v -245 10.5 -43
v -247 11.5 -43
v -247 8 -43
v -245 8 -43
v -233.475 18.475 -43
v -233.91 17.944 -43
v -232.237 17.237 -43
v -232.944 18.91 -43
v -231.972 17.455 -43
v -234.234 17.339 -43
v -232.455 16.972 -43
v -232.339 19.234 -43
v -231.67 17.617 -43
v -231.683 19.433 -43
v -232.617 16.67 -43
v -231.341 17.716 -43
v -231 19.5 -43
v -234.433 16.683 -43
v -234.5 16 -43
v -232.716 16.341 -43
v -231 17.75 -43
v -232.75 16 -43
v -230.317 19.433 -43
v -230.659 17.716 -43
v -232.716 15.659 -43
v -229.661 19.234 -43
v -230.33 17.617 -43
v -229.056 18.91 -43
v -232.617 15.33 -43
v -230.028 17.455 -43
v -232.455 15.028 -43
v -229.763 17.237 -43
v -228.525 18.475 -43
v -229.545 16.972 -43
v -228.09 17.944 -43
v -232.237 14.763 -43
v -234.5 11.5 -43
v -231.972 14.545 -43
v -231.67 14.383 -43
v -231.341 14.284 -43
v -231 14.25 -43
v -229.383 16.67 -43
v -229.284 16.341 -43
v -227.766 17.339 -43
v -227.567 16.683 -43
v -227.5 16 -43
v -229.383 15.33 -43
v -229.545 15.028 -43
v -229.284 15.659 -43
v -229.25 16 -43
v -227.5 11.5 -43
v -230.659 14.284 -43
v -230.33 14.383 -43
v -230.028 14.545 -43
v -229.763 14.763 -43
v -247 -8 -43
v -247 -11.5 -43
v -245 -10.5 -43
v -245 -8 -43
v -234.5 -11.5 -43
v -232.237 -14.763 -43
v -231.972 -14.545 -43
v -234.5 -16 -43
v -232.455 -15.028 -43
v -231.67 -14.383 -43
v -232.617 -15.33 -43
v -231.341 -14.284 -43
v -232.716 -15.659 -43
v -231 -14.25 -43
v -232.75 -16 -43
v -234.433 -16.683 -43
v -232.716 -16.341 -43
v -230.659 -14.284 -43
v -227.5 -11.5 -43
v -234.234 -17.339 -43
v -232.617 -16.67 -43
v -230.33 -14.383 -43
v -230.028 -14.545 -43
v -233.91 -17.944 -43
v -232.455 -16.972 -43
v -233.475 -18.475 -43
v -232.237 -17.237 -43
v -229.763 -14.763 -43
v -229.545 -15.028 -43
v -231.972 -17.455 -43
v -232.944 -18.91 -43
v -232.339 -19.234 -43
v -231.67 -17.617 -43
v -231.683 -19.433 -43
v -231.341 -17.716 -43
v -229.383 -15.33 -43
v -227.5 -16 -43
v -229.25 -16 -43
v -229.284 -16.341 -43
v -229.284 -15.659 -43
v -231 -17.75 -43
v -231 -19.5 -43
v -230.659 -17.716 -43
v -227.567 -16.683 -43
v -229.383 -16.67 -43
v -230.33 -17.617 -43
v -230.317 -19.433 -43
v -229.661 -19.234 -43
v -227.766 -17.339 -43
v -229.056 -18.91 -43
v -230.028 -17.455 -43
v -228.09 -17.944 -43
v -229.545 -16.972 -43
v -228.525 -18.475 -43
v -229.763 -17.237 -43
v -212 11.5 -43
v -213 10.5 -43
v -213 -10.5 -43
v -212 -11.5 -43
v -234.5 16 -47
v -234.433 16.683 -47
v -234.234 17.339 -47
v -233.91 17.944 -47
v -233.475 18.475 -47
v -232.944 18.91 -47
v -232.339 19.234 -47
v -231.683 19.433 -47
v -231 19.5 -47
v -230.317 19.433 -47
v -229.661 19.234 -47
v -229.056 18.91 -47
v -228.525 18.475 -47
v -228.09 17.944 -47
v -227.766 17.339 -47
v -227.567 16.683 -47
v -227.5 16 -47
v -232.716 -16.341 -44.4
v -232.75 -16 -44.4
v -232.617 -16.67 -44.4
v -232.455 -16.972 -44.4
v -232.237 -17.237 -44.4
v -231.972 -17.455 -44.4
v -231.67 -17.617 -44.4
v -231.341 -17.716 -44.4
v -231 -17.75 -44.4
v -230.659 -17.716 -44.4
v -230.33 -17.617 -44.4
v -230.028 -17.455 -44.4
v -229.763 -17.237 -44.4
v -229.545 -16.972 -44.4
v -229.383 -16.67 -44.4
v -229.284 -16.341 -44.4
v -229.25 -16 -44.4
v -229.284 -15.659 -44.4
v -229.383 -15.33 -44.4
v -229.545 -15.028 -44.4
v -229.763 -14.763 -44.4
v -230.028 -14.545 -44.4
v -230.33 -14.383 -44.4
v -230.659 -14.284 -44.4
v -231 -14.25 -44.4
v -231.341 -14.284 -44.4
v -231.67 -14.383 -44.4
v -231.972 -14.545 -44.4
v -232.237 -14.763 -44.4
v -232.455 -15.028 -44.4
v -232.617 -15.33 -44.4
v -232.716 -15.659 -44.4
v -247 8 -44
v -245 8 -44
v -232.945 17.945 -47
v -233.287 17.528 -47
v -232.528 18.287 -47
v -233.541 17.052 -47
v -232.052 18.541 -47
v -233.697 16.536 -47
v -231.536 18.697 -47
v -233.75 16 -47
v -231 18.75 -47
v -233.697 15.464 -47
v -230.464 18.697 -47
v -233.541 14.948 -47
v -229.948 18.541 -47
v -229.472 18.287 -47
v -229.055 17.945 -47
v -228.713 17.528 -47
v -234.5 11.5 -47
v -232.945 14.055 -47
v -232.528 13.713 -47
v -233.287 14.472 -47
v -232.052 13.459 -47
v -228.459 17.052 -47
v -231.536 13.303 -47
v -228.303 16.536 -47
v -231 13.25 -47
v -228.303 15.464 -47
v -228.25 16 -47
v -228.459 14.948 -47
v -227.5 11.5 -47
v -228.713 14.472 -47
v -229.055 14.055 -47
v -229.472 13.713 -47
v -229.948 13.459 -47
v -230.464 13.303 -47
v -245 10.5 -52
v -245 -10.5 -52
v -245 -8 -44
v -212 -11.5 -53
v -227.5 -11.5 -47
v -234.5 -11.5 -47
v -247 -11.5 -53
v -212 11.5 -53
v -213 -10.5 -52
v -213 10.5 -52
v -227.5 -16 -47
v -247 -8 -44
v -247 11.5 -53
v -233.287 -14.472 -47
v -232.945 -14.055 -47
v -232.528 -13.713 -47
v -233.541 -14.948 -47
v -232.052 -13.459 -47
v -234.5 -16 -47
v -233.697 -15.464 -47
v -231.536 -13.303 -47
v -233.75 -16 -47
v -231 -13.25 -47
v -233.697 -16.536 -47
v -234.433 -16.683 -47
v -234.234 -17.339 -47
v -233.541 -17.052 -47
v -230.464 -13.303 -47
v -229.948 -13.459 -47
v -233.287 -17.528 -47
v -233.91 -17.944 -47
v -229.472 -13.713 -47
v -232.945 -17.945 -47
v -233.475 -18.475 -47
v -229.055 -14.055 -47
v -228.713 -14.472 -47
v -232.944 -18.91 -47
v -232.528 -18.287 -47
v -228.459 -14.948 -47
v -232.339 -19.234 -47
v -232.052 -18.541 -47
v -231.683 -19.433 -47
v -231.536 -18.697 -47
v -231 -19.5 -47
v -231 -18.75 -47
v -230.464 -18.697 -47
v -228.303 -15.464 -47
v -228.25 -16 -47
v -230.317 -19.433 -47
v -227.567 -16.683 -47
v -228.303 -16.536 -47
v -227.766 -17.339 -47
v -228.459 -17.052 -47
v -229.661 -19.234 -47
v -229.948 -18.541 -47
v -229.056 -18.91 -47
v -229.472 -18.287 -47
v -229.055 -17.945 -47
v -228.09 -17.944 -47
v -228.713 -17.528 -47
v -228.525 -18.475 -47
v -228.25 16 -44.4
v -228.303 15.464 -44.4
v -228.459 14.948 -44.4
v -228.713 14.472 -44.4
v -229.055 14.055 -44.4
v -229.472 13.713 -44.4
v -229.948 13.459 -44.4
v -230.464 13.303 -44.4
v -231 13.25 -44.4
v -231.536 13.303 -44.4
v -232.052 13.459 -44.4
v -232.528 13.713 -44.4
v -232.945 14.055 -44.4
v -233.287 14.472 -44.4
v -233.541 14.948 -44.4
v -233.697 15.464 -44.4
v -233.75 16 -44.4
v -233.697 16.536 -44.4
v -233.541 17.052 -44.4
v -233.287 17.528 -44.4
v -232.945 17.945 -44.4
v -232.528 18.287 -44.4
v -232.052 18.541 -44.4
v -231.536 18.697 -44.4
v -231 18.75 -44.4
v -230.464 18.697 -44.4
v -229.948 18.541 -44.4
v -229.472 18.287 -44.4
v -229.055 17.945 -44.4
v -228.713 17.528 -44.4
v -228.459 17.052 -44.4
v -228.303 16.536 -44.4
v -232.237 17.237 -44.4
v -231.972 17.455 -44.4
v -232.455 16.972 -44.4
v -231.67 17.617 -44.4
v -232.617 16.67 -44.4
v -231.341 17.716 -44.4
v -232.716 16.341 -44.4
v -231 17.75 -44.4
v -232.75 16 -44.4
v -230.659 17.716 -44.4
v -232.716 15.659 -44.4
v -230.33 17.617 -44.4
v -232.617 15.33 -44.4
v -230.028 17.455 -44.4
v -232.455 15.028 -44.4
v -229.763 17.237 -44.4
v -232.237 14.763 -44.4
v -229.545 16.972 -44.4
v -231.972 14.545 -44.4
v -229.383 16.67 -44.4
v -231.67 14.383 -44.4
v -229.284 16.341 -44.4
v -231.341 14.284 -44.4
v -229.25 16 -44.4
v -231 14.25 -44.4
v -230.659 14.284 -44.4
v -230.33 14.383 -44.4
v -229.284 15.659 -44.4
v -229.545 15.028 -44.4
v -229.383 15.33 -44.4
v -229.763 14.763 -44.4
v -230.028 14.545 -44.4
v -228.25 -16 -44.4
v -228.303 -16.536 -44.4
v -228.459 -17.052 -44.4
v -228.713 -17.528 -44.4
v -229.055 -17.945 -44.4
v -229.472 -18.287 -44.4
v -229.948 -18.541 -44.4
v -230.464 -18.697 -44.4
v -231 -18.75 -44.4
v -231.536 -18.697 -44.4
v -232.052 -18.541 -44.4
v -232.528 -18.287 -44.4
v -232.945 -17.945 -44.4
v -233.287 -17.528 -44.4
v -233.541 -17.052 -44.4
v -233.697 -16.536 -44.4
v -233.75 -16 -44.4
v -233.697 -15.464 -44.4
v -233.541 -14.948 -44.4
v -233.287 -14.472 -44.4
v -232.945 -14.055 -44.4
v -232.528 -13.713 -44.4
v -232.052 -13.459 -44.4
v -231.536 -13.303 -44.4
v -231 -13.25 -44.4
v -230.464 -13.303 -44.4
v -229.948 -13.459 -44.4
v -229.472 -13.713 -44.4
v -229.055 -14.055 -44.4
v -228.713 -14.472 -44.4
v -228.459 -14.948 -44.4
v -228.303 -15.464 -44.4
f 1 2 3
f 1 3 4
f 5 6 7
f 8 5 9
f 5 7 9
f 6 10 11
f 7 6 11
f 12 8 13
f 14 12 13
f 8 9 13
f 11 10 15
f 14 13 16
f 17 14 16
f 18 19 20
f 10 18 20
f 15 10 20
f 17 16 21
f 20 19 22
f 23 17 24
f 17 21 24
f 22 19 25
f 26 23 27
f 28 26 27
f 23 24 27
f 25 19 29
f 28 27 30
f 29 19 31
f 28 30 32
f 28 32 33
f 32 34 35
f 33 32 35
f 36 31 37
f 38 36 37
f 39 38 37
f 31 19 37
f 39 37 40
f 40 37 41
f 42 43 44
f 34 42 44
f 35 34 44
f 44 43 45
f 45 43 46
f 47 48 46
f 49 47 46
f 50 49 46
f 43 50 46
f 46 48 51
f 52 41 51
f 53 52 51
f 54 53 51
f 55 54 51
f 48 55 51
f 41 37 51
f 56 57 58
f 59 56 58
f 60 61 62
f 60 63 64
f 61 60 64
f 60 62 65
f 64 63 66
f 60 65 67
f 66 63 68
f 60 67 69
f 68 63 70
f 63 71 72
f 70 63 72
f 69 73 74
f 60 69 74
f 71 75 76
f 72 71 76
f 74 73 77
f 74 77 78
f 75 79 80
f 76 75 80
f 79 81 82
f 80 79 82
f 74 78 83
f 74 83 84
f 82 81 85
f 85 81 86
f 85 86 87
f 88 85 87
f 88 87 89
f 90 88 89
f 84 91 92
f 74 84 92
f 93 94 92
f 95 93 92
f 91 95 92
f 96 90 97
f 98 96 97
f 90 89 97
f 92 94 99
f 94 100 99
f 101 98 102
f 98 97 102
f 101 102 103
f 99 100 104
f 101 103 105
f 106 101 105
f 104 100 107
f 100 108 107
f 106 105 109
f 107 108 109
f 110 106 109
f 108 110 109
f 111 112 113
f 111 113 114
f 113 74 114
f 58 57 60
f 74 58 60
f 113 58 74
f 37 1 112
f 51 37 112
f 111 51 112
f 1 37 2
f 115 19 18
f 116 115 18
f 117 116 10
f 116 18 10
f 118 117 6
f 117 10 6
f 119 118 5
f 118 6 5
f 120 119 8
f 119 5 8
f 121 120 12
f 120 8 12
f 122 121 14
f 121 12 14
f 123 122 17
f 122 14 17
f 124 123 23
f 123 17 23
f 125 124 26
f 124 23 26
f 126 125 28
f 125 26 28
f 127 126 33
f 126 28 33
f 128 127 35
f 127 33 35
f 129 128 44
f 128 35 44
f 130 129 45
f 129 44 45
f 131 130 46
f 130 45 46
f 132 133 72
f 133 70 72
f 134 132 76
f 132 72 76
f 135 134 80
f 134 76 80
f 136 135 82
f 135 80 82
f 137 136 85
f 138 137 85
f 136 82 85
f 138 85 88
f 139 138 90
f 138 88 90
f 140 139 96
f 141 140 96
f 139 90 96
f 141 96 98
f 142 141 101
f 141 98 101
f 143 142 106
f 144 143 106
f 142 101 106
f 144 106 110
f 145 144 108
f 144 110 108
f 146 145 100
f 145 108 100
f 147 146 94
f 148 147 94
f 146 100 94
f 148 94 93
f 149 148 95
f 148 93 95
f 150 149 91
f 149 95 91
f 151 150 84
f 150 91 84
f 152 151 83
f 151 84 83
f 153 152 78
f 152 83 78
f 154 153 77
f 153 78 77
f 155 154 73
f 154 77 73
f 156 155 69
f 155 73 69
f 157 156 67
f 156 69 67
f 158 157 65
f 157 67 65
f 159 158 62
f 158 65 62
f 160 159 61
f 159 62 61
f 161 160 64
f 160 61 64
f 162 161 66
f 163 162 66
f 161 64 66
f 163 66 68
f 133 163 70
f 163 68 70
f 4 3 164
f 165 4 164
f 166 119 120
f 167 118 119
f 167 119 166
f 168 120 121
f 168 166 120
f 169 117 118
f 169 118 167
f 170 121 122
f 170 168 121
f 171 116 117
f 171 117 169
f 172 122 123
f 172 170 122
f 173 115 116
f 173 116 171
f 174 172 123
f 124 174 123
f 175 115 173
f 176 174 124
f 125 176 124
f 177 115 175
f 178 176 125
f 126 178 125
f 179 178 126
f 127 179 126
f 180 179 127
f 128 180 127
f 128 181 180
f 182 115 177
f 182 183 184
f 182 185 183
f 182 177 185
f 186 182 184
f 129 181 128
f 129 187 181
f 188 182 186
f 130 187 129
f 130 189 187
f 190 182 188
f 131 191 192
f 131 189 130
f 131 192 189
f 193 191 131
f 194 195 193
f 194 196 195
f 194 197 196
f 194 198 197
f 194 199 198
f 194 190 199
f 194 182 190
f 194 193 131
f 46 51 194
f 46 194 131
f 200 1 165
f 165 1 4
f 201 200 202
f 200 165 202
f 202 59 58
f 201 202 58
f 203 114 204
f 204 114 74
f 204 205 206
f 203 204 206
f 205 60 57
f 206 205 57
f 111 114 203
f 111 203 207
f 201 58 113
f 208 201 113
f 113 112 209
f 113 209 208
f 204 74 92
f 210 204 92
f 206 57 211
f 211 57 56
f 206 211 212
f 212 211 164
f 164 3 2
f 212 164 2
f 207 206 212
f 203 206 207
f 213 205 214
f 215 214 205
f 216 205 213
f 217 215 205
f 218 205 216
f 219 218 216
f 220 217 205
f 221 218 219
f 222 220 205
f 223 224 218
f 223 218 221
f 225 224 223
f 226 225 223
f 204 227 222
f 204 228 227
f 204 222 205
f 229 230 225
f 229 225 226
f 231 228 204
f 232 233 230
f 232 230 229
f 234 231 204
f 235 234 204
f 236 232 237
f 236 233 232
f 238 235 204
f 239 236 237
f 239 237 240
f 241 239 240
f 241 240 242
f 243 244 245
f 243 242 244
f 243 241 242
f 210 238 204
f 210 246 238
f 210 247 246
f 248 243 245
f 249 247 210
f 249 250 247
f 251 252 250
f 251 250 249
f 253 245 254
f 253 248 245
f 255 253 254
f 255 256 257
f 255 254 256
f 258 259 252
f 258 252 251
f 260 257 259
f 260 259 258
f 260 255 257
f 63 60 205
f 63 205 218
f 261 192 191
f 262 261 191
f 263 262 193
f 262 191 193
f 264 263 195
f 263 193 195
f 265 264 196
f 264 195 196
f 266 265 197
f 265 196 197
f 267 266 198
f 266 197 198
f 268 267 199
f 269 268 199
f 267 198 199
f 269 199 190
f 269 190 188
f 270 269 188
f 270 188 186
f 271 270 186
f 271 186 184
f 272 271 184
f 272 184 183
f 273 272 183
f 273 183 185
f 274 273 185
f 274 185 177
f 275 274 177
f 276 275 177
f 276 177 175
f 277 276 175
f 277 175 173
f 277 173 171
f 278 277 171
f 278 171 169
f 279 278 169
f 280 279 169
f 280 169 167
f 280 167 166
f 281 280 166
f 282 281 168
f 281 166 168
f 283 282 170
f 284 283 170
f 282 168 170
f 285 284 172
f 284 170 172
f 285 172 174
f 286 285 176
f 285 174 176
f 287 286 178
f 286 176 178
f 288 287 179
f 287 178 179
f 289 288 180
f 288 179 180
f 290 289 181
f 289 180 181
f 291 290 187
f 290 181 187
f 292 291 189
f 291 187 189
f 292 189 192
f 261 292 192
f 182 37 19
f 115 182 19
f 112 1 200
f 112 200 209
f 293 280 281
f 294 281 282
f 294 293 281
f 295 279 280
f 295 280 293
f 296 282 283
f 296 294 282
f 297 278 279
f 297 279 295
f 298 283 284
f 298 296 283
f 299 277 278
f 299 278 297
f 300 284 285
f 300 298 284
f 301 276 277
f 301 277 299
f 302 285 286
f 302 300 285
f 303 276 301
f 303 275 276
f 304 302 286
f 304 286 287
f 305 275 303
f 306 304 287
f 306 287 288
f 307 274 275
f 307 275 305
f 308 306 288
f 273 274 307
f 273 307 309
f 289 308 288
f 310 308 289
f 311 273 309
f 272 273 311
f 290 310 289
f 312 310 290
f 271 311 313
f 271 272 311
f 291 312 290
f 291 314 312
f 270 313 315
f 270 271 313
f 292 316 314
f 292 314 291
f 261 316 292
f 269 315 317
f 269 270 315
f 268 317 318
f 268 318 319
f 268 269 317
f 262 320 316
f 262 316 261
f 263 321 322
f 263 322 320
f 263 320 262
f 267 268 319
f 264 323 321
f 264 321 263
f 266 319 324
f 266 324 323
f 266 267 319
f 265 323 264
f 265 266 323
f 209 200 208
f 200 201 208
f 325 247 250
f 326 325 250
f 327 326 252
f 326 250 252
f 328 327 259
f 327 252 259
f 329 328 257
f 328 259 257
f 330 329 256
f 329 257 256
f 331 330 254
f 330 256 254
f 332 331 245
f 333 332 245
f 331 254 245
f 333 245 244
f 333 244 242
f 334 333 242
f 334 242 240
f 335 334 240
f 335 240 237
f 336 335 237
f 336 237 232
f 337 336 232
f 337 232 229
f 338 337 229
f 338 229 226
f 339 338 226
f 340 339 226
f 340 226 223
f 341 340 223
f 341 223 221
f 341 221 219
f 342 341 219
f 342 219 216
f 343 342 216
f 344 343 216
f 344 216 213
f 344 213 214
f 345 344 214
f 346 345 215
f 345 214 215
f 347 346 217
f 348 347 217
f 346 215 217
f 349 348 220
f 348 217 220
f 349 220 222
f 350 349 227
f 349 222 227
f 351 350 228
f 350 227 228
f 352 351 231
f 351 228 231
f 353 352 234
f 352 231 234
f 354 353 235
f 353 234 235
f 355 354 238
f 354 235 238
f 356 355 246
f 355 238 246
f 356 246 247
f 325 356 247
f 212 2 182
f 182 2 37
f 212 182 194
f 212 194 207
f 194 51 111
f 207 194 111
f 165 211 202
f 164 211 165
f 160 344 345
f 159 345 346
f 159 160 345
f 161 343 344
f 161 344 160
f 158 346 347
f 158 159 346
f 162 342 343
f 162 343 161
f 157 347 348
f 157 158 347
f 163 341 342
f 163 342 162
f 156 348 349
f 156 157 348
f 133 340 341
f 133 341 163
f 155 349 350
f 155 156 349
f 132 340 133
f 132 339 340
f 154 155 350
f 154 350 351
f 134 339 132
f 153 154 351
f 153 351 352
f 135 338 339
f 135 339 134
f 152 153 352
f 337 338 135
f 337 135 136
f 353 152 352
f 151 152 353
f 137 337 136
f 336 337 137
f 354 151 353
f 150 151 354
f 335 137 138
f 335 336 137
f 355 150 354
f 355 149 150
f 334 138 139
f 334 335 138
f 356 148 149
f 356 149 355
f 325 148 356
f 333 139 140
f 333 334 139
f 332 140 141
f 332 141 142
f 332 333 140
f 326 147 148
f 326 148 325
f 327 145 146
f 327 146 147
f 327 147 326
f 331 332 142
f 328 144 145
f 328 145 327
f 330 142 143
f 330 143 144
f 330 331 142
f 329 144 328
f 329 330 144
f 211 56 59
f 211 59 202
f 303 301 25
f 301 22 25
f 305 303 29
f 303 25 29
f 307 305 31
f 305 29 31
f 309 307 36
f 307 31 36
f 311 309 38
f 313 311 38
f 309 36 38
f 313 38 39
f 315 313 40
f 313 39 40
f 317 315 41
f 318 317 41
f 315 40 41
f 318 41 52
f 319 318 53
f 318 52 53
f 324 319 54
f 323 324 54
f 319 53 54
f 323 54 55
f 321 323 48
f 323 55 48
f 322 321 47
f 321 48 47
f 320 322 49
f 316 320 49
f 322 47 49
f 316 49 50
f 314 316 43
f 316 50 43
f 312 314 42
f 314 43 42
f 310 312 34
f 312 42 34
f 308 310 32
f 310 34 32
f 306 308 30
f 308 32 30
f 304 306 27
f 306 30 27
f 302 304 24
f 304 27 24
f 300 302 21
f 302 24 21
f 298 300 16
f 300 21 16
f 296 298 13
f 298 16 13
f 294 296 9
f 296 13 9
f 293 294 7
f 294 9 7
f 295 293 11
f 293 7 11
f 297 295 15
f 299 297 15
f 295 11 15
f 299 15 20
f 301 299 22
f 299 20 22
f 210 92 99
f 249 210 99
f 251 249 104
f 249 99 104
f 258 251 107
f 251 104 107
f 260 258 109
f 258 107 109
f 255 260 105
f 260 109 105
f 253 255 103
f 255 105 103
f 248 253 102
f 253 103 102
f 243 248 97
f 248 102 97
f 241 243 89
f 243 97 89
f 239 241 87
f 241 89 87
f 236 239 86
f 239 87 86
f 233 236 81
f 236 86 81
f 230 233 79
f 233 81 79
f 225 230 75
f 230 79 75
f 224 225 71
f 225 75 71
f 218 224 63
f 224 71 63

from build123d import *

# Parameters (mm, degrees)
SKETCH270_W         = 32
SKETCH270_H         = 21
PAD127_DEPTH        = 4
SKETCH271_W         = 35
SKETCH271_H         = 23
SKETCH271_W_2       = 32
SKETCH271_H_2       = 21
PAD128_DEPTH        = 10
SKETCH272_W         = 35
SKETCH272_H         = 23
PAD129_DEPTH        = 1
SKETCH273_W         = 16
SKETCH273_H         = 1
POCKET111_DEPTH     = 5
HOLE011_D           = 3.5
HOLE011_DEPTH       = 25
HOLE011_CBORE_D     = 5.5
HOLE011_CBORE_DEPTH = 2.6


with BuildPart() as part:
    # Sketch270 → Pad127 (new body)
    with BuildSketch(Plane(origin=(0, 0, -20), x_dir=(1, 0, 0), z_dir=(0, 0, -1))):
        with BuildLine():
            ThreePointArc((-18.5, 16), (-22, 19.5), (-25.5, 16))
            Line((-25.5, 11.5), (-25.5, 16))
            Line((-25.5, 11.5), (-38, 11.5))
            Line((-38, 11.5), (-38, -11.5))
            Line((-38, -11.5), (-25.5, -11.5))
            Line((-25.5, -11.5), (-25.5, -16))
            ThreePointArc((-25.5, -16), (-22, -19.5), (-18.5, -16))
            Line((-18.5, -11.5), (-18.5, -16))
            Line((-18.5, -11.5), (-3, -11.5))
            Line((-3, 11.5), (-3, -11.5))
            Line((-3, 11.5), (-18.5, 11.5))
            Line((-18.5, 11.5), (-18.5, 16))
        make_face()
        with Locations((-20, 0)):
            Rectangle(SKETCH270_W, SKETCH270_H, mode=Mode.SUBTRACT)
    extrude(amount=PAD127_DEPTH)

    # Sketch271 → Pad128 (join)
    with BuildSketch(Plane(origin=(0, 0, -20), x_dir=(1, 0, 0), z_dir=(0, 0, -1))):
        with Locations((-20.5, 0)):
            Rectangle(SKETCH271_W, SKETCH271_H)
        with Locations((-20, 0)):
            Rectangle(SKETCH271_W_2, SKETCH271_H_2, mode=Mode.SUBTRACT)
    extrude(amount=PAD128_DEPTH)

    # Sketch272 (on Face20 of Pad128) → Pad129 (join)
    with BuildSketch(Plane(origin=(0, 0, -30), x_dir=(1, 0, 0), z_dir=(0, 0, -1))):
        with Locations((-20.5, 0)):
            Rectangle(SKETCH272_W, SKETCH272_H)
    extrude(amount=-PAD129_DEPTH)

    # Sketch273 (on Face12 of Pad129) → Pocket111 (cut)
    with BuildSketch(Plane(origin=(-38, 0, -20), x_dir=(0, 1, 0), z_dir=(-1, 0, 0))):
        with Locations((0, 0.5)):
            Rectangle(SKETCH273_W, SKETCH273_H)
    extrude(amount=-POCKET111_DEPTH, mode=Mode.SUBTRACT)

    # Hole011
    with Locations(Plane(origin=(0, 0, -24), x_dir=(1, 0, 0), z_dir=(0, 0, -1))):
        with Locations((-22, 16), (-22, -16)):
            CounterBoreHole(HOLE011_D / 2, HOLE011_CBORE_D / 2, HOLE011_CBORE_DEPTH, depth=HOLE011_DEPTH)


with BuildPart() as part_1:
    # Body029 placement: moved
    add(part.part.moved(Location((-209, 0, -23))))


solid = part_1.part
